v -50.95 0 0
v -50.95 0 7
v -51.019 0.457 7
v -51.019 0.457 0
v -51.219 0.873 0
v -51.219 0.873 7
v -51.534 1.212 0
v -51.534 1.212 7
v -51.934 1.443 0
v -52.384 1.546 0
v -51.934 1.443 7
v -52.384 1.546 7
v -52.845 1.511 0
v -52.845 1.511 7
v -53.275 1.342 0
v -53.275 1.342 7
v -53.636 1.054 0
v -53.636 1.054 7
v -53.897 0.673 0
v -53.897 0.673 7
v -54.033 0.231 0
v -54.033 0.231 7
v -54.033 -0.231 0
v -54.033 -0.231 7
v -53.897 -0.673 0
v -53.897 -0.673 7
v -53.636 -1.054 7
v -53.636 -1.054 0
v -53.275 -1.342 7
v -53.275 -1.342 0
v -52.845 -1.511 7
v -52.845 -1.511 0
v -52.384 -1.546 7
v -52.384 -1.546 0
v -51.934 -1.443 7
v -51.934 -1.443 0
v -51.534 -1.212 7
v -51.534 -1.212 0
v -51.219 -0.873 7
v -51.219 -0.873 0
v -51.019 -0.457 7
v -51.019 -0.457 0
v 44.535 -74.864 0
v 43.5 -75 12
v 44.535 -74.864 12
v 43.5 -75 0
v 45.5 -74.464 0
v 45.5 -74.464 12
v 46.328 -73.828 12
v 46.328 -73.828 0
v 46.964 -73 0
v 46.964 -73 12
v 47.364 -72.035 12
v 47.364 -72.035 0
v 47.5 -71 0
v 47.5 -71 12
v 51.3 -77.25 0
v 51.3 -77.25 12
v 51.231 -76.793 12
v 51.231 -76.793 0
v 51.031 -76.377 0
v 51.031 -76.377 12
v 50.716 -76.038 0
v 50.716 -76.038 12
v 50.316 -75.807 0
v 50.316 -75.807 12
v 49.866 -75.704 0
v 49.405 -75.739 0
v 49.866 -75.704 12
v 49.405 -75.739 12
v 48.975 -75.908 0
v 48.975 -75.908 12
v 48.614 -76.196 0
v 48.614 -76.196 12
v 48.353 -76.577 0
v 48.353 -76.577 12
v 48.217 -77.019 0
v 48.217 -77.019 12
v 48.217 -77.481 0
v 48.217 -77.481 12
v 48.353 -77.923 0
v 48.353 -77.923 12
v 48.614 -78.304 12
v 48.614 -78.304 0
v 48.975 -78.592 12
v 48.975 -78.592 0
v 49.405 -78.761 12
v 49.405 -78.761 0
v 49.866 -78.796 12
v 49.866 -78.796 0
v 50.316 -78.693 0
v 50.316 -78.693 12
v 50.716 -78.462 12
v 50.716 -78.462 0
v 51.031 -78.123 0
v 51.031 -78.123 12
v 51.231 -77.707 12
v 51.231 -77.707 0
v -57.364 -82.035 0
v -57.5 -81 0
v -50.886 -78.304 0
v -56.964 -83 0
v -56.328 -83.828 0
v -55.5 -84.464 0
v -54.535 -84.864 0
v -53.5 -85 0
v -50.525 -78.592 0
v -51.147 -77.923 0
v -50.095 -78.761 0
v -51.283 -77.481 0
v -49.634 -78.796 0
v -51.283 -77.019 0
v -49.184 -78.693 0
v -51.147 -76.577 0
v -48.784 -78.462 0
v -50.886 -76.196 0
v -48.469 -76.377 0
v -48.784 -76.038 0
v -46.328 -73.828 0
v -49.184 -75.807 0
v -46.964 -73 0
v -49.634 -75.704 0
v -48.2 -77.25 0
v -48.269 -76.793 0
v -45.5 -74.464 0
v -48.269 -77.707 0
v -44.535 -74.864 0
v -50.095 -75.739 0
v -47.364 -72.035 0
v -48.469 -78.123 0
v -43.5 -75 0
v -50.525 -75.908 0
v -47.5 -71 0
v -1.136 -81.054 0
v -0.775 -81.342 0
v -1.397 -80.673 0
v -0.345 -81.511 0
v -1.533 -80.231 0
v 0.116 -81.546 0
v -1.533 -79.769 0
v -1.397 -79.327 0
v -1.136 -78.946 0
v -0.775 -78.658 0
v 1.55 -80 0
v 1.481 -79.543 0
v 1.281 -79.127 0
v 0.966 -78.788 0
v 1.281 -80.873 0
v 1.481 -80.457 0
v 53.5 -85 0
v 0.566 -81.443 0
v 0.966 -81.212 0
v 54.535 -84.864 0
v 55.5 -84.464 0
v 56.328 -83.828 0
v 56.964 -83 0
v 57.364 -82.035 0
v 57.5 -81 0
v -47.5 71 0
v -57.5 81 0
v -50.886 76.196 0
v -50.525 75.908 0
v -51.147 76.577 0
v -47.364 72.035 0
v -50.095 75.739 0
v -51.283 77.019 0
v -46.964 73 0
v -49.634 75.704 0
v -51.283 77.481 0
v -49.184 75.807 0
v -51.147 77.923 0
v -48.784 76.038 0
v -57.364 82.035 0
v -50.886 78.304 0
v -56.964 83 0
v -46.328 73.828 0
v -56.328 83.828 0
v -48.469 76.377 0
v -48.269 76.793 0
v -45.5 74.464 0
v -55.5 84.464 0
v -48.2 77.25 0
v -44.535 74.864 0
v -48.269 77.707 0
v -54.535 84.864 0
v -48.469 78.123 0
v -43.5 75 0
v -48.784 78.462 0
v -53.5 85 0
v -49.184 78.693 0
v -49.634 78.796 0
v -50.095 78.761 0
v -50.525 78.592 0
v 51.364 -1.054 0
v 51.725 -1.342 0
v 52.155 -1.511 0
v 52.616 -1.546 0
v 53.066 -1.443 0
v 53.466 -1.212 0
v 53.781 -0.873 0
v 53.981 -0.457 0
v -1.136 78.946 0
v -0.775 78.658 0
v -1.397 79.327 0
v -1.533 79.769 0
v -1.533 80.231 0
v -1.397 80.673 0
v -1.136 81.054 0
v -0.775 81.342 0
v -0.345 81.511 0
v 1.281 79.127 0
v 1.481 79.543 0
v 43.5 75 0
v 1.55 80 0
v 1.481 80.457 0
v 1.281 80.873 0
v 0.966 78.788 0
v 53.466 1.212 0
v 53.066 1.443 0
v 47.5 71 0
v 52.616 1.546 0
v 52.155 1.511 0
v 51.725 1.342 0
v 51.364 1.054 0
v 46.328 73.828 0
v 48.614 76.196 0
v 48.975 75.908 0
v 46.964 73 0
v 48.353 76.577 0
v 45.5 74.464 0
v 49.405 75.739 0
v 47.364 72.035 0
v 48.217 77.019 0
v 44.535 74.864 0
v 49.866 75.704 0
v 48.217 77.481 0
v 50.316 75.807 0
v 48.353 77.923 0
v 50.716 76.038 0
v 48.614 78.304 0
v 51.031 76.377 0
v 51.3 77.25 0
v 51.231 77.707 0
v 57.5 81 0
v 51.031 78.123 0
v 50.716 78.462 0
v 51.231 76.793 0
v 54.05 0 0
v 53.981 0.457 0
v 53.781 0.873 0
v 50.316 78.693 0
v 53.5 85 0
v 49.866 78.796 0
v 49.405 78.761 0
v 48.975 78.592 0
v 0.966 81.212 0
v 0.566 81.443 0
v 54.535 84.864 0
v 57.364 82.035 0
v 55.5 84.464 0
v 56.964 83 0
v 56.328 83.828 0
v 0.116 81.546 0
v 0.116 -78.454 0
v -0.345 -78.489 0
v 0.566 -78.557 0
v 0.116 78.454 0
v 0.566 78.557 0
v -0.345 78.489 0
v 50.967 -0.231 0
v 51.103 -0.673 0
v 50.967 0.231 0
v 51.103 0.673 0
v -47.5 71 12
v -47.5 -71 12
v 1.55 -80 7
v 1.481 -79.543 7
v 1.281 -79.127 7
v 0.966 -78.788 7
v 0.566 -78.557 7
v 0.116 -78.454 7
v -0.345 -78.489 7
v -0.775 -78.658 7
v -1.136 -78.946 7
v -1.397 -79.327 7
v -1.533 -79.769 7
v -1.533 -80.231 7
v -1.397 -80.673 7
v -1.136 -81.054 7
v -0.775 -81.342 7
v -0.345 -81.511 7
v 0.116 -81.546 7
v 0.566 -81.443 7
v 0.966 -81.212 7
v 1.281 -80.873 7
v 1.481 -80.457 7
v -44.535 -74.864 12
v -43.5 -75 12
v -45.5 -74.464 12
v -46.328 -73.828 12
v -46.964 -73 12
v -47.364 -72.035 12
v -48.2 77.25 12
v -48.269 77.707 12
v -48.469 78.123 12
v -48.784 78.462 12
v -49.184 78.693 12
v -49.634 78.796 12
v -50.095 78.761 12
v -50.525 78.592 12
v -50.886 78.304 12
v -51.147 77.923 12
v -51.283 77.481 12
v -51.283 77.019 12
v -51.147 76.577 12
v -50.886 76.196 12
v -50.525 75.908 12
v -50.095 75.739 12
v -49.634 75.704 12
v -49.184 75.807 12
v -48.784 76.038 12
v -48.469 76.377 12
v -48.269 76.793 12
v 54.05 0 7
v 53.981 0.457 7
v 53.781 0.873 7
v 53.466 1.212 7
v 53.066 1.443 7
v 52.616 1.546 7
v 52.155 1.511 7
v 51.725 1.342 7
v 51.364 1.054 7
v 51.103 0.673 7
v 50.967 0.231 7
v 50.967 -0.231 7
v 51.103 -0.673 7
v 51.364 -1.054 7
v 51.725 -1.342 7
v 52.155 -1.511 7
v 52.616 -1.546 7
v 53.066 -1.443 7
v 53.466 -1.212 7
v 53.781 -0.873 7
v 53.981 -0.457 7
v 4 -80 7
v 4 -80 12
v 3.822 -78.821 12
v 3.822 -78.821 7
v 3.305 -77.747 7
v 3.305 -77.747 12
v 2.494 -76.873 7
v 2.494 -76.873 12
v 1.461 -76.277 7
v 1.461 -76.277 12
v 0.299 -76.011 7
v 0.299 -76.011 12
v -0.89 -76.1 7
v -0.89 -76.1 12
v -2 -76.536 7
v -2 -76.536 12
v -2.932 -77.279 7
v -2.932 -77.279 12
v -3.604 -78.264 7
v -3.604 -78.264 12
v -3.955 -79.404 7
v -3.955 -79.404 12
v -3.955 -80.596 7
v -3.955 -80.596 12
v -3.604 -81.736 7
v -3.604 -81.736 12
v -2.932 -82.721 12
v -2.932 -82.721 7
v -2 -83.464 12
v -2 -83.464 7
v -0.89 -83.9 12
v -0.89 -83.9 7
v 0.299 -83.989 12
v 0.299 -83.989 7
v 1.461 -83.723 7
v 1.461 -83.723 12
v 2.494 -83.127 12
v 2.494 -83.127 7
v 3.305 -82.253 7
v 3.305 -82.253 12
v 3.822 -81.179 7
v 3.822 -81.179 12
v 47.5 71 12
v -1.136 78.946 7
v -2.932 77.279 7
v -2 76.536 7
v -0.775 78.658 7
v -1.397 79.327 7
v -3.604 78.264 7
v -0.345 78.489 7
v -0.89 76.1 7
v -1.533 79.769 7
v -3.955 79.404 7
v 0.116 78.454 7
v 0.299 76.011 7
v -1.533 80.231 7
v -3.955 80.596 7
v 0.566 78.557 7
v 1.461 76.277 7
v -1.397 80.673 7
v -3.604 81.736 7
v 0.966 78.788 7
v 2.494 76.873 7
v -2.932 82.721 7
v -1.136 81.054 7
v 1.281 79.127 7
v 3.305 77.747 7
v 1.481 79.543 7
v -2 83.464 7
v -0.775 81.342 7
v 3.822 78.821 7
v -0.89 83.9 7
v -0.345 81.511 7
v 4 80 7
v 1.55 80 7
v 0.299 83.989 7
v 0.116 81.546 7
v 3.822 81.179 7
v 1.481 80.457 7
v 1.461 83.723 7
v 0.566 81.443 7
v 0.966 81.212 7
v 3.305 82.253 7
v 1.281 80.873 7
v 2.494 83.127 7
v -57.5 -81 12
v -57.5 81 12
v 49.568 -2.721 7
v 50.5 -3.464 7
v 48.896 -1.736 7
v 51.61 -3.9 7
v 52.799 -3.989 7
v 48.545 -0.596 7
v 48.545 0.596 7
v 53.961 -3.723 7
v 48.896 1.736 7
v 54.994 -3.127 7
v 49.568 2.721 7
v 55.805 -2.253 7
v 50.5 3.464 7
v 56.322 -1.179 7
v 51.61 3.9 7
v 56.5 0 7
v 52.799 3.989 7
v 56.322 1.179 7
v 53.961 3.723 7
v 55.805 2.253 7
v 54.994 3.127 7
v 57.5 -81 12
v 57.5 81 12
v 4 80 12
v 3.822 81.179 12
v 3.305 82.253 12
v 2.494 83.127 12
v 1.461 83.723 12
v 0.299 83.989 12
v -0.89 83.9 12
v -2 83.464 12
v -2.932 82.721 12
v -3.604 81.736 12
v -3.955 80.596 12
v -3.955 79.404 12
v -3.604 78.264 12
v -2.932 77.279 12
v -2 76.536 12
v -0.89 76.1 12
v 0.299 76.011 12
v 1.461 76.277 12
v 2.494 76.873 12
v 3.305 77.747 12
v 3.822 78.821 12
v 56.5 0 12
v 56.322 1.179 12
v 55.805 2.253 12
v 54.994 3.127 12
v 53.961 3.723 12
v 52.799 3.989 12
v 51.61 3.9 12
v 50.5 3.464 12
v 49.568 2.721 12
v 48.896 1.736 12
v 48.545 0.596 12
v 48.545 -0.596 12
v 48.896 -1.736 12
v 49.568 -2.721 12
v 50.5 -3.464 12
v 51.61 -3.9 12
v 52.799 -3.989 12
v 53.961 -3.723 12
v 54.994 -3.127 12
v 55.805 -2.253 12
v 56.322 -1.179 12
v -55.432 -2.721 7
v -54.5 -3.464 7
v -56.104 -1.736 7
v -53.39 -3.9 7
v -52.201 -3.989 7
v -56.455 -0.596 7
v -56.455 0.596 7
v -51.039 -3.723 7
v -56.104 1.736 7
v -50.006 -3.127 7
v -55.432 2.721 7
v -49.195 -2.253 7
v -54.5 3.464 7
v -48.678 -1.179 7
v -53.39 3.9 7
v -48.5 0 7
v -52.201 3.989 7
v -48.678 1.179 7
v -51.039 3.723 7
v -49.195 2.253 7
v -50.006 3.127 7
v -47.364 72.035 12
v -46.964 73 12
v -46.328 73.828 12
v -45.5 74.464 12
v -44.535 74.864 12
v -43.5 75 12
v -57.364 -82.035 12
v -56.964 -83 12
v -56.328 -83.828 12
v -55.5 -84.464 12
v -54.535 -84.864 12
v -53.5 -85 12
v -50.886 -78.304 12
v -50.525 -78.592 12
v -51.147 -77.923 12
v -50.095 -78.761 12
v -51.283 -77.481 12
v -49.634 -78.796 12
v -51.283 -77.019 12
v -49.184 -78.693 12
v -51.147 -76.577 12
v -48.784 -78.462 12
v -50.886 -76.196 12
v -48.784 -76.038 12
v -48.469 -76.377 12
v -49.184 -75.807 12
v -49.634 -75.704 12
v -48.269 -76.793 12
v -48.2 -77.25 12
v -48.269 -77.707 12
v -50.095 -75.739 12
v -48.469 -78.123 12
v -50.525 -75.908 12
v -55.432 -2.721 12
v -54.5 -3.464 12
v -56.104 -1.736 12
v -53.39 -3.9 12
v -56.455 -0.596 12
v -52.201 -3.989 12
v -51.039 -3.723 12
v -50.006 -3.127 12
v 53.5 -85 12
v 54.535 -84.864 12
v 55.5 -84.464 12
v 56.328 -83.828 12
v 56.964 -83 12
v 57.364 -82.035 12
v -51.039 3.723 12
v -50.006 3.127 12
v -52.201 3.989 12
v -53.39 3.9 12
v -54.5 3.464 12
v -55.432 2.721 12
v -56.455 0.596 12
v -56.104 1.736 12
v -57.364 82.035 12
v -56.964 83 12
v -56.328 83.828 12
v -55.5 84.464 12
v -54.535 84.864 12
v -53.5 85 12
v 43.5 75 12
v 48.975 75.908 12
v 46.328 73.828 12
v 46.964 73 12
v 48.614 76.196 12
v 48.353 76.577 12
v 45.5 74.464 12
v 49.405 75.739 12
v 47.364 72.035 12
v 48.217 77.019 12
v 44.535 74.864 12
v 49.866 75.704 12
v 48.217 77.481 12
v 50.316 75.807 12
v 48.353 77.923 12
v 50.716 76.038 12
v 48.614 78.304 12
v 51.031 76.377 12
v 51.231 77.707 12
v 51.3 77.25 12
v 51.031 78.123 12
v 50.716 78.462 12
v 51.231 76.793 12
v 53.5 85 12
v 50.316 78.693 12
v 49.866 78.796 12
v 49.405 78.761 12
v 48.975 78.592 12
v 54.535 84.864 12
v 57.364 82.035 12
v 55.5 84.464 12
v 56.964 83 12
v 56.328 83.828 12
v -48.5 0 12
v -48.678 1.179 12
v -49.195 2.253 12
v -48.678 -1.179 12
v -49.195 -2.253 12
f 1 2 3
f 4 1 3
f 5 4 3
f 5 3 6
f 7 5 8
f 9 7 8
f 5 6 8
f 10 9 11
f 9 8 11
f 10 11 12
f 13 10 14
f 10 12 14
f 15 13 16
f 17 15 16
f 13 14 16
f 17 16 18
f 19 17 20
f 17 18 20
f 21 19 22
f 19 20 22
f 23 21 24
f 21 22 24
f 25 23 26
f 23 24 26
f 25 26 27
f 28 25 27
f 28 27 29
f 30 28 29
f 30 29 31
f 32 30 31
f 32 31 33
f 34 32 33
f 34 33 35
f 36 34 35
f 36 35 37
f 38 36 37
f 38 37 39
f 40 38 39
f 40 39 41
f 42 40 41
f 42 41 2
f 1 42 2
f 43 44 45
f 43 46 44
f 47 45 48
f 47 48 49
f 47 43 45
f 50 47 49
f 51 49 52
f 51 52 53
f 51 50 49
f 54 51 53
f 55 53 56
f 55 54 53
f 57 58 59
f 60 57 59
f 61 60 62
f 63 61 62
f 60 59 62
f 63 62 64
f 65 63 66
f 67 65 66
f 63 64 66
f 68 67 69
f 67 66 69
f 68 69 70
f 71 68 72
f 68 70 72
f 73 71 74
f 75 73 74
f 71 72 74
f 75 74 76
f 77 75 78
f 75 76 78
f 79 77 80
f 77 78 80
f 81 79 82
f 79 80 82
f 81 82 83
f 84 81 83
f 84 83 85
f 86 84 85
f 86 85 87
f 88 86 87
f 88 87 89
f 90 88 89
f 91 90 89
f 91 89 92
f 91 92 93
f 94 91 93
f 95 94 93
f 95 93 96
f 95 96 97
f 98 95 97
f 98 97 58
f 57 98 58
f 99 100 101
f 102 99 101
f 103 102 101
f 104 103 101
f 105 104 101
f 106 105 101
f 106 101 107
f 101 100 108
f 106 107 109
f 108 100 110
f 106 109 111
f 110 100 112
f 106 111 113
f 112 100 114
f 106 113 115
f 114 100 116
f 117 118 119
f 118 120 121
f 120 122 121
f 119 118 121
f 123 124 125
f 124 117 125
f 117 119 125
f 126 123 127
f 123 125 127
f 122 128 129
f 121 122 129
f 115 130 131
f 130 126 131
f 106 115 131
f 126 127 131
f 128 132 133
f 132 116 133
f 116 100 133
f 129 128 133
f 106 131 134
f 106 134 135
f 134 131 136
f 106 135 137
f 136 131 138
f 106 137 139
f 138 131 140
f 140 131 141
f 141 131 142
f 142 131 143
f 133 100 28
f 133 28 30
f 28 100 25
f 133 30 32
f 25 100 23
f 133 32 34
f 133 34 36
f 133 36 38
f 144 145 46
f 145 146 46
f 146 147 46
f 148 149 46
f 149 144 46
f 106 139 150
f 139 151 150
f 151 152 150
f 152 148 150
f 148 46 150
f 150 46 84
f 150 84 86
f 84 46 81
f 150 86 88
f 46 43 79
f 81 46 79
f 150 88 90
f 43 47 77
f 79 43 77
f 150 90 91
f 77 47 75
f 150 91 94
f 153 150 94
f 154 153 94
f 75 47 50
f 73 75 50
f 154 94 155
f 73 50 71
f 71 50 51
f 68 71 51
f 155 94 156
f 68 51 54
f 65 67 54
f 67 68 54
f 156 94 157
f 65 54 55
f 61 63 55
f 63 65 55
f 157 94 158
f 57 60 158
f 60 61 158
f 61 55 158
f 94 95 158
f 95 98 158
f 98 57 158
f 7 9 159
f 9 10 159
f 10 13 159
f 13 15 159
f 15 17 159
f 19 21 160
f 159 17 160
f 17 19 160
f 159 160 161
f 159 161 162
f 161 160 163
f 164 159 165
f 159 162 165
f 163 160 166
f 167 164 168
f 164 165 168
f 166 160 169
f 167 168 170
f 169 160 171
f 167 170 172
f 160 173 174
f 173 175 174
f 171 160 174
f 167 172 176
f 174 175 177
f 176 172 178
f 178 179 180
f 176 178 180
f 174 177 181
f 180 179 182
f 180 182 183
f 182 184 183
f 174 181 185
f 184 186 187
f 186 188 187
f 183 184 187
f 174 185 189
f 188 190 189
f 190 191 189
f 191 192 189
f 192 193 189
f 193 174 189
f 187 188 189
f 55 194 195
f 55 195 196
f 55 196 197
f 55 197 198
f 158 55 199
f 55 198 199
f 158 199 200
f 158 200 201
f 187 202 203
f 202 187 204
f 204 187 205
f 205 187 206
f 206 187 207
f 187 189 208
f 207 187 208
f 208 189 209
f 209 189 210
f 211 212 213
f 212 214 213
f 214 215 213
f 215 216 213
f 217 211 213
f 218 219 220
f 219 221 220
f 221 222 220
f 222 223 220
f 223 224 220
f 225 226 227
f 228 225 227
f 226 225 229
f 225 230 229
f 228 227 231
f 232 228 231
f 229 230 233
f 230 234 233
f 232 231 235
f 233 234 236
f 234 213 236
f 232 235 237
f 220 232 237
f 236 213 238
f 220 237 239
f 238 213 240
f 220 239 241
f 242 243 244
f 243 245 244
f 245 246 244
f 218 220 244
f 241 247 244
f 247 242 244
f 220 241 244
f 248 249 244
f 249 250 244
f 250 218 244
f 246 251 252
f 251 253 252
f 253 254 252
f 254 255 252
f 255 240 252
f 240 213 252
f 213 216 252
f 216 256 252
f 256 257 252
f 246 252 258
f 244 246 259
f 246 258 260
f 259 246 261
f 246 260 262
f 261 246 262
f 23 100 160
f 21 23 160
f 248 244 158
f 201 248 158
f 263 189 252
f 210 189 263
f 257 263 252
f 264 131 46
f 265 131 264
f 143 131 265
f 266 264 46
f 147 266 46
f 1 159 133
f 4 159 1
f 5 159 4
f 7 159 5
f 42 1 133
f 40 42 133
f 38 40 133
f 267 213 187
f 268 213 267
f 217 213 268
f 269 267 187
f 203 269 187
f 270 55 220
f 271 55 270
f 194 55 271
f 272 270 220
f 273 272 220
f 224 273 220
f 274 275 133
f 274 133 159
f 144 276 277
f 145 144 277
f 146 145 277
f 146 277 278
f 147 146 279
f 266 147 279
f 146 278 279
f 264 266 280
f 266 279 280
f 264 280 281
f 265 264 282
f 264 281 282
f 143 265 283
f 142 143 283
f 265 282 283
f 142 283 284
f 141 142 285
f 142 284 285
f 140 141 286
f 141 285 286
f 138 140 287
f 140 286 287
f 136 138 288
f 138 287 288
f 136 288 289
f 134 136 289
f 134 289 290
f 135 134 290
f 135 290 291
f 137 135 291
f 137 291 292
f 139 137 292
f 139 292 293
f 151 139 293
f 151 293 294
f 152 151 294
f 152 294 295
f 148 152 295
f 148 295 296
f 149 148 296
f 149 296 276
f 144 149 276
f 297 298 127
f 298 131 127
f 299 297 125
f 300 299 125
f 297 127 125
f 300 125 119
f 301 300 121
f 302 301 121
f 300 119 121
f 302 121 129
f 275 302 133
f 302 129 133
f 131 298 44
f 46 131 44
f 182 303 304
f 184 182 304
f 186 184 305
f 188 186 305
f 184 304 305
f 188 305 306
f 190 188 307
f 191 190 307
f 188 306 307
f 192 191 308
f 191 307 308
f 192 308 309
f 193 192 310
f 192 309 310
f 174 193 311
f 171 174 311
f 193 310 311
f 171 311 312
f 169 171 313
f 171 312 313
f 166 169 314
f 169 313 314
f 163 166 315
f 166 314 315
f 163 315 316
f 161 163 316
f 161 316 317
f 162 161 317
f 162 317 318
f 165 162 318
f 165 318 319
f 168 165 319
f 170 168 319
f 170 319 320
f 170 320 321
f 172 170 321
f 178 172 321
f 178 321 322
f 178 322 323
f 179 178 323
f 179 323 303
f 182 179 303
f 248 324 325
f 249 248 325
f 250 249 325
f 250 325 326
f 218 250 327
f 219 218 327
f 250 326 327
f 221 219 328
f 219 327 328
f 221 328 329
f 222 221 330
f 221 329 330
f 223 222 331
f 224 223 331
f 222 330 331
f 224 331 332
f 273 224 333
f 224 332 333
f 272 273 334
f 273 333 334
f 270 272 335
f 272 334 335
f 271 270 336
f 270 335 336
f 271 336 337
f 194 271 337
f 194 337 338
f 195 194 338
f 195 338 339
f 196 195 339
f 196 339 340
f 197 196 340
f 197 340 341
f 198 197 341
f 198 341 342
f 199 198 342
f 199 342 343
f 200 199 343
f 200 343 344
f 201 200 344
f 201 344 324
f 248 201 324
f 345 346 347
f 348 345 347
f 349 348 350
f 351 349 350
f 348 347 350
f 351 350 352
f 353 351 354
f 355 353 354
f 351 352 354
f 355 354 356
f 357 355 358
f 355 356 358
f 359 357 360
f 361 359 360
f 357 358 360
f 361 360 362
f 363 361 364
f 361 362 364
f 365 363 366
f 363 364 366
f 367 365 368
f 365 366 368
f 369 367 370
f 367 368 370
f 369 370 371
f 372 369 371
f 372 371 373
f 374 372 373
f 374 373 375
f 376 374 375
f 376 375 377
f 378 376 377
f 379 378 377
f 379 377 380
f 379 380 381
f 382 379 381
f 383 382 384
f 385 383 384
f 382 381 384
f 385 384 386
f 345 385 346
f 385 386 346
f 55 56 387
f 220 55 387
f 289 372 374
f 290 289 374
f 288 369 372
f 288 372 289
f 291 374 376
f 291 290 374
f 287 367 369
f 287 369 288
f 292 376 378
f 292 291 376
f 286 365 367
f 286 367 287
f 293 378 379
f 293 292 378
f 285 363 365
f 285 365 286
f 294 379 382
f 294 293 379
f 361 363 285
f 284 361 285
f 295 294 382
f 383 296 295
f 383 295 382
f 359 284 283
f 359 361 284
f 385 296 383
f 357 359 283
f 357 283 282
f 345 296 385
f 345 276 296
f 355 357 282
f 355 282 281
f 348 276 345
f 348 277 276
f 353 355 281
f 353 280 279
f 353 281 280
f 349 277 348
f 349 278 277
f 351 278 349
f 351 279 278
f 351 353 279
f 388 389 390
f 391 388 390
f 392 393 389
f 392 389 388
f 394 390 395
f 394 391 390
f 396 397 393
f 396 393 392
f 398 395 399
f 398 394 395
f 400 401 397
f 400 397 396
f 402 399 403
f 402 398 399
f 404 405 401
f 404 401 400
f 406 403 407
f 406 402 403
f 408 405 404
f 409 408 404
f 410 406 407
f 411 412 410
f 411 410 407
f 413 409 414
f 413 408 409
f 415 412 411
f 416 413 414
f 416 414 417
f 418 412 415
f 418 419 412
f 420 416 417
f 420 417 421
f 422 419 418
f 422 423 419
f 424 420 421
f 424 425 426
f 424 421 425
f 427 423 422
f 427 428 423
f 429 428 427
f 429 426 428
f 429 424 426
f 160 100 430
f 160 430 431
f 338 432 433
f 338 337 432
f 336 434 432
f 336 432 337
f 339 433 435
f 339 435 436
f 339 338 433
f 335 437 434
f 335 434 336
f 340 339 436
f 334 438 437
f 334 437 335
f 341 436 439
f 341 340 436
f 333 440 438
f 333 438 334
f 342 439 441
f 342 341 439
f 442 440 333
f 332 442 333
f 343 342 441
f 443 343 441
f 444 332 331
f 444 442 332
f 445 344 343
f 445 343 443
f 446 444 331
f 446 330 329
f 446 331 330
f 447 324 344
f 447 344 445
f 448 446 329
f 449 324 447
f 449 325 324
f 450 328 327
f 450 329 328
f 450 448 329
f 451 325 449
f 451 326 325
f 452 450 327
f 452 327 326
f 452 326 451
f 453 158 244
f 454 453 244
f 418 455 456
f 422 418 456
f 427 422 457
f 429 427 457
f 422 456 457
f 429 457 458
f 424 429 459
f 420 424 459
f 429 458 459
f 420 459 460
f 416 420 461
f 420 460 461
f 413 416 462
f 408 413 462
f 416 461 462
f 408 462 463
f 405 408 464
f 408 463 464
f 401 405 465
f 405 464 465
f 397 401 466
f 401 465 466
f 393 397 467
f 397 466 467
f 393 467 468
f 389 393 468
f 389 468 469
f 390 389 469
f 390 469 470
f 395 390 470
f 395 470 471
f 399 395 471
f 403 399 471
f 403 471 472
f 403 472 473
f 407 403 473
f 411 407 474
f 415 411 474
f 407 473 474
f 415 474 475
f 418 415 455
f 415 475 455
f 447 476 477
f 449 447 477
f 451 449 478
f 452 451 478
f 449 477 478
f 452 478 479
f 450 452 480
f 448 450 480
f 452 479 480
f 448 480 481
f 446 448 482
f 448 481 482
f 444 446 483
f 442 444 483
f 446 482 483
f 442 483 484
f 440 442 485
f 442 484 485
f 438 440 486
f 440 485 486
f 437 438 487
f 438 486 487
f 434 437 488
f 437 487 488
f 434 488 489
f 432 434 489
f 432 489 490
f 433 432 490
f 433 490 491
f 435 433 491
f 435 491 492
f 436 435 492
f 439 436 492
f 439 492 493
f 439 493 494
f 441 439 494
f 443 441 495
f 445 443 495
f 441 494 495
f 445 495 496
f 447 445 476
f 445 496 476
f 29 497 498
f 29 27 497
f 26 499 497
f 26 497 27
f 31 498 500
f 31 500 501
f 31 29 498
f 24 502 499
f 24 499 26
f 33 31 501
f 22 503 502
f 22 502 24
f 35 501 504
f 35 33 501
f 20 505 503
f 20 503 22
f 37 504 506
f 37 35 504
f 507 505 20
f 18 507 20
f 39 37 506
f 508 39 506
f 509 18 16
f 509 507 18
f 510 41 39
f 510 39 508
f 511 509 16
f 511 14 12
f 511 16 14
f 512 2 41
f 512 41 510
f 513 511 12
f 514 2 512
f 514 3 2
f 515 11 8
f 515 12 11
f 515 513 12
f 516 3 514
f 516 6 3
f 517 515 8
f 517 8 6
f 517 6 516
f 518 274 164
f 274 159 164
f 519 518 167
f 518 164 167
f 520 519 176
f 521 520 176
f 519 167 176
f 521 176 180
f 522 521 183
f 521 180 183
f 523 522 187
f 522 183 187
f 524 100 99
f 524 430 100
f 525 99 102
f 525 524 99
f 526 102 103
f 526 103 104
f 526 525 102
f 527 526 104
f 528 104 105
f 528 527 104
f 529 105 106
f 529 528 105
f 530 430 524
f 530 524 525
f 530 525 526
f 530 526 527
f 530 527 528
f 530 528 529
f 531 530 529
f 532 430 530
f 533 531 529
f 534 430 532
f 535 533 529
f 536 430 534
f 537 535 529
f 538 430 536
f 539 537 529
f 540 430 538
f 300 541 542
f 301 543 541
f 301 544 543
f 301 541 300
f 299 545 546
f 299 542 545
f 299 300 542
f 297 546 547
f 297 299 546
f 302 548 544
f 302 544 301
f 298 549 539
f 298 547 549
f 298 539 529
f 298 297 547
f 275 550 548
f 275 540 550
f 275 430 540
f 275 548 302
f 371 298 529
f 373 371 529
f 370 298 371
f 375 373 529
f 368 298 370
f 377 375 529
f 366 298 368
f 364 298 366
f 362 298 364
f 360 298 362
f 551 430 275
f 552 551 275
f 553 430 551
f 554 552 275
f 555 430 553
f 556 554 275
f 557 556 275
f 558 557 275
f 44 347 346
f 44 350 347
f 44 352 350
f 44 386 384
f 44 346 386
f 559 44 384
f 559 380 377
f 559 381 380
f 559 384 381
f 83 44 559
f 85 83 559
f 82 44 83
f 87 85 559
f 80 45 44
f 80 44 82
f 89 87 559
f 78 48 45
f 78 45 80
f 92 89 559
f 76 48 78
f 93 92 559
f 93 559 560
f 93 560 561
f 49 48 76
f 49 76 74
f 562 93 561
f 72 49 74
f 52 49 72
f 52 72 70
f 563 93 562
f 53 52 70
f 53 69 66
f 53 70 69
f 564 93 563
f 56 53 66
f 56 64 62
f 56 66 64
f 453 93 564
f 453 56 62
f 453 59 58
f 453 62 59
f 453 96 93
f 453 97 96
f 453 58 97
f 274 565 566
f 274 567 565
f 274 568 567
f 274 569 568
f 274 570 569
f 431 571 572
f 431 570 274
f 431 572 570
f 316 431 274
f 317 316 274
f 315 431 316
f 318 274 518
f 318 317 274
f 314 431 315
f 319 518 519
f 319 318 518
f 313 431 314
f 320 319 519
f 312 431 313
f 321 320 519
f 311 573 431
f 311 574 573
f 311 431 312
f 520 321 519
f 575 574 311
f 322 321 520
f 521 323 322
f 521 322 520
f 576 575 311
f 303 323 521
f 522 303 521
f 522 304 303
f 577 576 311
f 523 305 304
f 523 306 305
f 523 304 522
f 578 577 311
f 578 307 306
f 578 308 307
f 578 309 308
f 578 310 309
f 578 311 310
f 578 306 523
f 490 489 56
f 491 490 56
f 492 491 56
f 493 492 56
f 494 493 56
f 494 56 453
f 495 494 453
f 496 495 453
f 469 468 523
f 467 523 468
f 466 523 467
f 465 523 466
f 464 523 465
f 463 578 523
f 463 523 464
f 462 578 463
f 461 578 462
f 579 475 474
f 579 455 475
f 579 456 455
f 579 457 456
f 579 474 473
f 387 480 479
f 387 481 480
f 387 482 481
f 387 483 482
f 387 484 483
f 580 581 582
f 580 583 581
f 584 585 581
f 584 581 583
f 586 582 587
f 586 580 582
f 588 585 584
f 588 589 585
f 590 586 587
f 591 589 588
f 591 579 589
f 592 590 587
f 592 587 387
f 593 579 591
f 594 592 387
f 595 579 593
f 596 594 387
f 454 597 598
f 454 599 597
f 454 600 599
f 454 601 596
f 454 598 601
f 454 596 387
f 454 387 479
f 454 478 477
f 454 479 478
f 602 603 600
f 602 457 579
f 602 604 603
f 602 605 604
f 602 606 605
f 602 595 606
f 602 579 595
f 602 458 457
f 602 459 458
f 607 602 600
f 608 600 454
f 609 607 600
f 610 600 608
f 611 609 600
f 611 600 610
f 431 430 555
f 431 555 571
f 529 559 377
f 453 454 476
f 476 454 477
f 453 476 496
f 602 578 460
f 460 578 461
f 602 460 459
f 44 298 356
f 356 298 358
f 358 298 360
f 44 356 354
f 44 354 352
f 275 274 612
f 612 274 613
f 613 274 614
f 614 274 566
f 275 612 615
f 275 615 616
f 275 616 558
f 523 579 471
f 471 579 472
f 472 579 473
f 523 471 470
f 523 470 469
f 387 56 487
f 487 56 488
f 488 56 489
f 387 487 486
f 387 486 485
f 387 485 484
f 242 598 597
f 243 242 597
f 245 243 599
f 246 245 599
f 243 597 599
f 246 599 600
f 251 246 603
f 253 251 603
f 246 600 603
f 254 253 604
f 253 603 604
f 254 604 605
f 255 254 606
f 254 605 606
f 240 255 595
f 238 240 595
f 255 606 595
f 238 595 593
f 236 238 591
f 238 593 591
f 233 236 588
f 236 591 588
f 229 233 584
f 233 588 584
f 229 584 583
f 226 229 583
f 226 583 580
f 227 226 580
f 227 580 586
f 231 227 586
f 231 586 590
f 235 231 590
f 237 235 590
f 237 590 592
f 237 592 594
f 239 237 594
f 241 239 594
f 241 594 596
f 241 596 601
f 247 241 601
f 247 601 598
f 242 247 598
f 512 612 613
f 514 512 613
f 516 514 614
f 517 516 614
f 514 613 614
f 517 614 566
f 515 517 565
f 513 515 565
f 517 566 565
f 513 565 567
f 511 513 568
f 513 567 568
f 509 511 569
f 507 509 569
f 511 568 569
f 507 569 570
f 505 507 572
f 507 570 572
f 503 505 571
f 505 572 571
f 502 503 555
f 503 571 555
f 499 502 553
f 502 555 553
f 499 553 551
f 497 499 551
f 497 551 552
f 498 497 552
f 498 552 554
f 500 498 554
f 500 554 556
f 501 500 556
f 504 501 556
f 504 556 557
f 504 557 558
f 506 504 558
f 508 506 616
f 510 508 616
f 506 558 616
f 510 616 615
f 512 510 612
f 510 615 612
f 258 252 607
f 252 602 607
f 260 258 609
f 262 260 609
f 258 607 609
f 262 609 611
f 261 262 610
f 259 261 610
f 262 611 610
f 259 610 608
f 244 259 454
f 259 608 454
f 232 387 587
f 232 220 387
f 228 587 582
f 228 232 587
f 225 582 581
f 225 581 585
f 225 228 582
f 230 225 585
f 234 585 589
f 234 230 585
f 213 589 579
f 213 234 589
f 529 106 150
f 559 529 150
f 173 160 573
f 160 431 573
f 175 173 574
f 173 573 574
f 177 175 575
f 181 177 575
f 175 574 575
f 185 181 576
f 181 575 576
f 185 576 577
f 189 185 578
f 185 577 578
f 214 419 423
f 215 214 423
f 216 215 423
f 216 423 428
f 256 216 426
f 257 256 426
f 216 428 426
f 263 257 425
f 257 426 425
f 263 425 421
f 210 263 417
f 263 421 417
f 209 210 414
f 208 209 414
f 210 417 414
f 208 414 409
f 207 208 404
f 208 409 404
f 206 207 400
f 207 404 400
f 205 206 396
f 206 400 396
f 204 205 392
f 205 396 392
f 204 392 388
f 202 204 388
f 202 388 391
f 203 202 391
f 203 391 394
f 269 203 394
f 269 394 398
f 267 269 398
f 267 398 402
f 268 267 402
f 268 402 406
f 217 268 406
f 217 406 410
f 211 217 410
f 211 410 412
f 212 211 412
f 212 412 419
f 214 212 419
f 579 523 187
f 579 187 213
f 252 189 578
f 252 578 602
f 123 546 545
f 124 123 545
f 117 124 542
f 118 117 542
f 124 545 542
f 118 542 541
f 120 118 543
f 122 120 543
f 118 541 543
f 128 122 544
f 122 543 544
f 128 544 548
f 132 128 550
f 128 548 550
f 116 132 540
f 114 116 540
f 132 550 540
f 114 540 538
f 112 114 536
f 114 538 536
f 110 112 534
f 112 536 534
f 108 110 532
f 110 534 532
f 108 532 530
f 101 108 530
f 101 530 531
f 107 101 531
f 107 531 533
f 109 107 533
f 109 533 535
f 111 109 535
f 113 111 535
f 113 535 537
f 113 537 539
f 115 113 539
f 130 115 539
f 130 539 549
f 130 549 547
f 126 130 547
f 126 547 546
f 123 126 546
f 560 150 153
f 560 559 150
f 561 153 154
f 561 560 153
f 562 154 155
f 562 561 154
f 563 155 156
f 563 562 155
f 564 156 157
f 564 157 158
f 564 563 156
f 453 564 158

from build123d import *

# Parameters (mm, degrees)
F0_W      = 115
F0_H      = 170
F1_DEPTH  = 12
F2_W      = 95
F2_H      = 150
F3_DEPTH  = 12.001
F4_R      = 1.55
F5_DEPTH  = 12.001
F6_R      = 4
F7_R      = 1.55
F8_DEPTH  = 12.001
F9_R      = 4
F10_DEPTH = 5


with BuildPart() as f1:
    # F0 (on Top) → F1 (new body)
    with BuildSketch(Plane.XY):
        Rectangle(F0_W, F0_H)
    extrude(amount=F1_DEPTH)

    # F2 (on face) → F3 (cut, through all)
    with BuildSketch(Plane.XY.offset(12)):
        Rectangle(F2_W, F2_H)
    extrude(amount=-F3_DEPTH, mode=Mode.SUBTRACT)

    # F4 (on face) → F5 (cut, through all)
    with BuildSketch(Plane.XY.offset(12)):
        with Locations((0, 80)):
            Circle(F4_R)
        with Locations((0, -80)):
            Circle(F4_R)
        with Locations((52.5, 0)):
            Circle(F4_R)
        with Locations((-52.5, 0)):
            Circle(F4_R)
    extrude(amount=-F5_DEPTH, mode=Mode.SUBTRACT)

    # F6
    f6_edges = [f1.edges().sort_by_distance(p)[0] for p in [
        (47.5, 75, 6),
        (-47.5, 75, 6),
        (57.5, 85, 6),
        (57.5, -85, 6),
        (-57.5, -85, 6),
        (-57.5, 85, 6),
        (47.5, -75, 6),
        (-47.5, -75, 6),
    ]]
    fillet(f6_edges, radius=F6_R)

    # F7 (on face) → F8 (cut, through all)
    with BuildSketch(Plane.XY.offset(12)):
        with Locations((-49.75, 77.25)):
            Circle(F7_R)
        with Locations((49.75, 77.25)):
            Circle(F7_R)
        with Locations((49.75, -77.25)):
            Circle(F7_R)
        with Locations((-49.75, -77.25)):
            Circle(F7_R)
    extrude(amount=-F8_DEPTH, mode=Mode.SUBTRACT)

    # F9 (on face) → F10 (cut)
    with BuildSketch(Plane.XY.offset(12)):
        with Locations((0, 80)):
            Circle(F9_R)
        with Locations((-52.5, 0)):
            Circle(F9_R)
        with Locations((0, -80)):
            Circle(F9_R)
        with Locations((52.5, 0)):
            Circle(F9_R)
    extrude(amount=-F10_DEPTH, mode=Mode.SUBTRACT)


solid = f1.part
